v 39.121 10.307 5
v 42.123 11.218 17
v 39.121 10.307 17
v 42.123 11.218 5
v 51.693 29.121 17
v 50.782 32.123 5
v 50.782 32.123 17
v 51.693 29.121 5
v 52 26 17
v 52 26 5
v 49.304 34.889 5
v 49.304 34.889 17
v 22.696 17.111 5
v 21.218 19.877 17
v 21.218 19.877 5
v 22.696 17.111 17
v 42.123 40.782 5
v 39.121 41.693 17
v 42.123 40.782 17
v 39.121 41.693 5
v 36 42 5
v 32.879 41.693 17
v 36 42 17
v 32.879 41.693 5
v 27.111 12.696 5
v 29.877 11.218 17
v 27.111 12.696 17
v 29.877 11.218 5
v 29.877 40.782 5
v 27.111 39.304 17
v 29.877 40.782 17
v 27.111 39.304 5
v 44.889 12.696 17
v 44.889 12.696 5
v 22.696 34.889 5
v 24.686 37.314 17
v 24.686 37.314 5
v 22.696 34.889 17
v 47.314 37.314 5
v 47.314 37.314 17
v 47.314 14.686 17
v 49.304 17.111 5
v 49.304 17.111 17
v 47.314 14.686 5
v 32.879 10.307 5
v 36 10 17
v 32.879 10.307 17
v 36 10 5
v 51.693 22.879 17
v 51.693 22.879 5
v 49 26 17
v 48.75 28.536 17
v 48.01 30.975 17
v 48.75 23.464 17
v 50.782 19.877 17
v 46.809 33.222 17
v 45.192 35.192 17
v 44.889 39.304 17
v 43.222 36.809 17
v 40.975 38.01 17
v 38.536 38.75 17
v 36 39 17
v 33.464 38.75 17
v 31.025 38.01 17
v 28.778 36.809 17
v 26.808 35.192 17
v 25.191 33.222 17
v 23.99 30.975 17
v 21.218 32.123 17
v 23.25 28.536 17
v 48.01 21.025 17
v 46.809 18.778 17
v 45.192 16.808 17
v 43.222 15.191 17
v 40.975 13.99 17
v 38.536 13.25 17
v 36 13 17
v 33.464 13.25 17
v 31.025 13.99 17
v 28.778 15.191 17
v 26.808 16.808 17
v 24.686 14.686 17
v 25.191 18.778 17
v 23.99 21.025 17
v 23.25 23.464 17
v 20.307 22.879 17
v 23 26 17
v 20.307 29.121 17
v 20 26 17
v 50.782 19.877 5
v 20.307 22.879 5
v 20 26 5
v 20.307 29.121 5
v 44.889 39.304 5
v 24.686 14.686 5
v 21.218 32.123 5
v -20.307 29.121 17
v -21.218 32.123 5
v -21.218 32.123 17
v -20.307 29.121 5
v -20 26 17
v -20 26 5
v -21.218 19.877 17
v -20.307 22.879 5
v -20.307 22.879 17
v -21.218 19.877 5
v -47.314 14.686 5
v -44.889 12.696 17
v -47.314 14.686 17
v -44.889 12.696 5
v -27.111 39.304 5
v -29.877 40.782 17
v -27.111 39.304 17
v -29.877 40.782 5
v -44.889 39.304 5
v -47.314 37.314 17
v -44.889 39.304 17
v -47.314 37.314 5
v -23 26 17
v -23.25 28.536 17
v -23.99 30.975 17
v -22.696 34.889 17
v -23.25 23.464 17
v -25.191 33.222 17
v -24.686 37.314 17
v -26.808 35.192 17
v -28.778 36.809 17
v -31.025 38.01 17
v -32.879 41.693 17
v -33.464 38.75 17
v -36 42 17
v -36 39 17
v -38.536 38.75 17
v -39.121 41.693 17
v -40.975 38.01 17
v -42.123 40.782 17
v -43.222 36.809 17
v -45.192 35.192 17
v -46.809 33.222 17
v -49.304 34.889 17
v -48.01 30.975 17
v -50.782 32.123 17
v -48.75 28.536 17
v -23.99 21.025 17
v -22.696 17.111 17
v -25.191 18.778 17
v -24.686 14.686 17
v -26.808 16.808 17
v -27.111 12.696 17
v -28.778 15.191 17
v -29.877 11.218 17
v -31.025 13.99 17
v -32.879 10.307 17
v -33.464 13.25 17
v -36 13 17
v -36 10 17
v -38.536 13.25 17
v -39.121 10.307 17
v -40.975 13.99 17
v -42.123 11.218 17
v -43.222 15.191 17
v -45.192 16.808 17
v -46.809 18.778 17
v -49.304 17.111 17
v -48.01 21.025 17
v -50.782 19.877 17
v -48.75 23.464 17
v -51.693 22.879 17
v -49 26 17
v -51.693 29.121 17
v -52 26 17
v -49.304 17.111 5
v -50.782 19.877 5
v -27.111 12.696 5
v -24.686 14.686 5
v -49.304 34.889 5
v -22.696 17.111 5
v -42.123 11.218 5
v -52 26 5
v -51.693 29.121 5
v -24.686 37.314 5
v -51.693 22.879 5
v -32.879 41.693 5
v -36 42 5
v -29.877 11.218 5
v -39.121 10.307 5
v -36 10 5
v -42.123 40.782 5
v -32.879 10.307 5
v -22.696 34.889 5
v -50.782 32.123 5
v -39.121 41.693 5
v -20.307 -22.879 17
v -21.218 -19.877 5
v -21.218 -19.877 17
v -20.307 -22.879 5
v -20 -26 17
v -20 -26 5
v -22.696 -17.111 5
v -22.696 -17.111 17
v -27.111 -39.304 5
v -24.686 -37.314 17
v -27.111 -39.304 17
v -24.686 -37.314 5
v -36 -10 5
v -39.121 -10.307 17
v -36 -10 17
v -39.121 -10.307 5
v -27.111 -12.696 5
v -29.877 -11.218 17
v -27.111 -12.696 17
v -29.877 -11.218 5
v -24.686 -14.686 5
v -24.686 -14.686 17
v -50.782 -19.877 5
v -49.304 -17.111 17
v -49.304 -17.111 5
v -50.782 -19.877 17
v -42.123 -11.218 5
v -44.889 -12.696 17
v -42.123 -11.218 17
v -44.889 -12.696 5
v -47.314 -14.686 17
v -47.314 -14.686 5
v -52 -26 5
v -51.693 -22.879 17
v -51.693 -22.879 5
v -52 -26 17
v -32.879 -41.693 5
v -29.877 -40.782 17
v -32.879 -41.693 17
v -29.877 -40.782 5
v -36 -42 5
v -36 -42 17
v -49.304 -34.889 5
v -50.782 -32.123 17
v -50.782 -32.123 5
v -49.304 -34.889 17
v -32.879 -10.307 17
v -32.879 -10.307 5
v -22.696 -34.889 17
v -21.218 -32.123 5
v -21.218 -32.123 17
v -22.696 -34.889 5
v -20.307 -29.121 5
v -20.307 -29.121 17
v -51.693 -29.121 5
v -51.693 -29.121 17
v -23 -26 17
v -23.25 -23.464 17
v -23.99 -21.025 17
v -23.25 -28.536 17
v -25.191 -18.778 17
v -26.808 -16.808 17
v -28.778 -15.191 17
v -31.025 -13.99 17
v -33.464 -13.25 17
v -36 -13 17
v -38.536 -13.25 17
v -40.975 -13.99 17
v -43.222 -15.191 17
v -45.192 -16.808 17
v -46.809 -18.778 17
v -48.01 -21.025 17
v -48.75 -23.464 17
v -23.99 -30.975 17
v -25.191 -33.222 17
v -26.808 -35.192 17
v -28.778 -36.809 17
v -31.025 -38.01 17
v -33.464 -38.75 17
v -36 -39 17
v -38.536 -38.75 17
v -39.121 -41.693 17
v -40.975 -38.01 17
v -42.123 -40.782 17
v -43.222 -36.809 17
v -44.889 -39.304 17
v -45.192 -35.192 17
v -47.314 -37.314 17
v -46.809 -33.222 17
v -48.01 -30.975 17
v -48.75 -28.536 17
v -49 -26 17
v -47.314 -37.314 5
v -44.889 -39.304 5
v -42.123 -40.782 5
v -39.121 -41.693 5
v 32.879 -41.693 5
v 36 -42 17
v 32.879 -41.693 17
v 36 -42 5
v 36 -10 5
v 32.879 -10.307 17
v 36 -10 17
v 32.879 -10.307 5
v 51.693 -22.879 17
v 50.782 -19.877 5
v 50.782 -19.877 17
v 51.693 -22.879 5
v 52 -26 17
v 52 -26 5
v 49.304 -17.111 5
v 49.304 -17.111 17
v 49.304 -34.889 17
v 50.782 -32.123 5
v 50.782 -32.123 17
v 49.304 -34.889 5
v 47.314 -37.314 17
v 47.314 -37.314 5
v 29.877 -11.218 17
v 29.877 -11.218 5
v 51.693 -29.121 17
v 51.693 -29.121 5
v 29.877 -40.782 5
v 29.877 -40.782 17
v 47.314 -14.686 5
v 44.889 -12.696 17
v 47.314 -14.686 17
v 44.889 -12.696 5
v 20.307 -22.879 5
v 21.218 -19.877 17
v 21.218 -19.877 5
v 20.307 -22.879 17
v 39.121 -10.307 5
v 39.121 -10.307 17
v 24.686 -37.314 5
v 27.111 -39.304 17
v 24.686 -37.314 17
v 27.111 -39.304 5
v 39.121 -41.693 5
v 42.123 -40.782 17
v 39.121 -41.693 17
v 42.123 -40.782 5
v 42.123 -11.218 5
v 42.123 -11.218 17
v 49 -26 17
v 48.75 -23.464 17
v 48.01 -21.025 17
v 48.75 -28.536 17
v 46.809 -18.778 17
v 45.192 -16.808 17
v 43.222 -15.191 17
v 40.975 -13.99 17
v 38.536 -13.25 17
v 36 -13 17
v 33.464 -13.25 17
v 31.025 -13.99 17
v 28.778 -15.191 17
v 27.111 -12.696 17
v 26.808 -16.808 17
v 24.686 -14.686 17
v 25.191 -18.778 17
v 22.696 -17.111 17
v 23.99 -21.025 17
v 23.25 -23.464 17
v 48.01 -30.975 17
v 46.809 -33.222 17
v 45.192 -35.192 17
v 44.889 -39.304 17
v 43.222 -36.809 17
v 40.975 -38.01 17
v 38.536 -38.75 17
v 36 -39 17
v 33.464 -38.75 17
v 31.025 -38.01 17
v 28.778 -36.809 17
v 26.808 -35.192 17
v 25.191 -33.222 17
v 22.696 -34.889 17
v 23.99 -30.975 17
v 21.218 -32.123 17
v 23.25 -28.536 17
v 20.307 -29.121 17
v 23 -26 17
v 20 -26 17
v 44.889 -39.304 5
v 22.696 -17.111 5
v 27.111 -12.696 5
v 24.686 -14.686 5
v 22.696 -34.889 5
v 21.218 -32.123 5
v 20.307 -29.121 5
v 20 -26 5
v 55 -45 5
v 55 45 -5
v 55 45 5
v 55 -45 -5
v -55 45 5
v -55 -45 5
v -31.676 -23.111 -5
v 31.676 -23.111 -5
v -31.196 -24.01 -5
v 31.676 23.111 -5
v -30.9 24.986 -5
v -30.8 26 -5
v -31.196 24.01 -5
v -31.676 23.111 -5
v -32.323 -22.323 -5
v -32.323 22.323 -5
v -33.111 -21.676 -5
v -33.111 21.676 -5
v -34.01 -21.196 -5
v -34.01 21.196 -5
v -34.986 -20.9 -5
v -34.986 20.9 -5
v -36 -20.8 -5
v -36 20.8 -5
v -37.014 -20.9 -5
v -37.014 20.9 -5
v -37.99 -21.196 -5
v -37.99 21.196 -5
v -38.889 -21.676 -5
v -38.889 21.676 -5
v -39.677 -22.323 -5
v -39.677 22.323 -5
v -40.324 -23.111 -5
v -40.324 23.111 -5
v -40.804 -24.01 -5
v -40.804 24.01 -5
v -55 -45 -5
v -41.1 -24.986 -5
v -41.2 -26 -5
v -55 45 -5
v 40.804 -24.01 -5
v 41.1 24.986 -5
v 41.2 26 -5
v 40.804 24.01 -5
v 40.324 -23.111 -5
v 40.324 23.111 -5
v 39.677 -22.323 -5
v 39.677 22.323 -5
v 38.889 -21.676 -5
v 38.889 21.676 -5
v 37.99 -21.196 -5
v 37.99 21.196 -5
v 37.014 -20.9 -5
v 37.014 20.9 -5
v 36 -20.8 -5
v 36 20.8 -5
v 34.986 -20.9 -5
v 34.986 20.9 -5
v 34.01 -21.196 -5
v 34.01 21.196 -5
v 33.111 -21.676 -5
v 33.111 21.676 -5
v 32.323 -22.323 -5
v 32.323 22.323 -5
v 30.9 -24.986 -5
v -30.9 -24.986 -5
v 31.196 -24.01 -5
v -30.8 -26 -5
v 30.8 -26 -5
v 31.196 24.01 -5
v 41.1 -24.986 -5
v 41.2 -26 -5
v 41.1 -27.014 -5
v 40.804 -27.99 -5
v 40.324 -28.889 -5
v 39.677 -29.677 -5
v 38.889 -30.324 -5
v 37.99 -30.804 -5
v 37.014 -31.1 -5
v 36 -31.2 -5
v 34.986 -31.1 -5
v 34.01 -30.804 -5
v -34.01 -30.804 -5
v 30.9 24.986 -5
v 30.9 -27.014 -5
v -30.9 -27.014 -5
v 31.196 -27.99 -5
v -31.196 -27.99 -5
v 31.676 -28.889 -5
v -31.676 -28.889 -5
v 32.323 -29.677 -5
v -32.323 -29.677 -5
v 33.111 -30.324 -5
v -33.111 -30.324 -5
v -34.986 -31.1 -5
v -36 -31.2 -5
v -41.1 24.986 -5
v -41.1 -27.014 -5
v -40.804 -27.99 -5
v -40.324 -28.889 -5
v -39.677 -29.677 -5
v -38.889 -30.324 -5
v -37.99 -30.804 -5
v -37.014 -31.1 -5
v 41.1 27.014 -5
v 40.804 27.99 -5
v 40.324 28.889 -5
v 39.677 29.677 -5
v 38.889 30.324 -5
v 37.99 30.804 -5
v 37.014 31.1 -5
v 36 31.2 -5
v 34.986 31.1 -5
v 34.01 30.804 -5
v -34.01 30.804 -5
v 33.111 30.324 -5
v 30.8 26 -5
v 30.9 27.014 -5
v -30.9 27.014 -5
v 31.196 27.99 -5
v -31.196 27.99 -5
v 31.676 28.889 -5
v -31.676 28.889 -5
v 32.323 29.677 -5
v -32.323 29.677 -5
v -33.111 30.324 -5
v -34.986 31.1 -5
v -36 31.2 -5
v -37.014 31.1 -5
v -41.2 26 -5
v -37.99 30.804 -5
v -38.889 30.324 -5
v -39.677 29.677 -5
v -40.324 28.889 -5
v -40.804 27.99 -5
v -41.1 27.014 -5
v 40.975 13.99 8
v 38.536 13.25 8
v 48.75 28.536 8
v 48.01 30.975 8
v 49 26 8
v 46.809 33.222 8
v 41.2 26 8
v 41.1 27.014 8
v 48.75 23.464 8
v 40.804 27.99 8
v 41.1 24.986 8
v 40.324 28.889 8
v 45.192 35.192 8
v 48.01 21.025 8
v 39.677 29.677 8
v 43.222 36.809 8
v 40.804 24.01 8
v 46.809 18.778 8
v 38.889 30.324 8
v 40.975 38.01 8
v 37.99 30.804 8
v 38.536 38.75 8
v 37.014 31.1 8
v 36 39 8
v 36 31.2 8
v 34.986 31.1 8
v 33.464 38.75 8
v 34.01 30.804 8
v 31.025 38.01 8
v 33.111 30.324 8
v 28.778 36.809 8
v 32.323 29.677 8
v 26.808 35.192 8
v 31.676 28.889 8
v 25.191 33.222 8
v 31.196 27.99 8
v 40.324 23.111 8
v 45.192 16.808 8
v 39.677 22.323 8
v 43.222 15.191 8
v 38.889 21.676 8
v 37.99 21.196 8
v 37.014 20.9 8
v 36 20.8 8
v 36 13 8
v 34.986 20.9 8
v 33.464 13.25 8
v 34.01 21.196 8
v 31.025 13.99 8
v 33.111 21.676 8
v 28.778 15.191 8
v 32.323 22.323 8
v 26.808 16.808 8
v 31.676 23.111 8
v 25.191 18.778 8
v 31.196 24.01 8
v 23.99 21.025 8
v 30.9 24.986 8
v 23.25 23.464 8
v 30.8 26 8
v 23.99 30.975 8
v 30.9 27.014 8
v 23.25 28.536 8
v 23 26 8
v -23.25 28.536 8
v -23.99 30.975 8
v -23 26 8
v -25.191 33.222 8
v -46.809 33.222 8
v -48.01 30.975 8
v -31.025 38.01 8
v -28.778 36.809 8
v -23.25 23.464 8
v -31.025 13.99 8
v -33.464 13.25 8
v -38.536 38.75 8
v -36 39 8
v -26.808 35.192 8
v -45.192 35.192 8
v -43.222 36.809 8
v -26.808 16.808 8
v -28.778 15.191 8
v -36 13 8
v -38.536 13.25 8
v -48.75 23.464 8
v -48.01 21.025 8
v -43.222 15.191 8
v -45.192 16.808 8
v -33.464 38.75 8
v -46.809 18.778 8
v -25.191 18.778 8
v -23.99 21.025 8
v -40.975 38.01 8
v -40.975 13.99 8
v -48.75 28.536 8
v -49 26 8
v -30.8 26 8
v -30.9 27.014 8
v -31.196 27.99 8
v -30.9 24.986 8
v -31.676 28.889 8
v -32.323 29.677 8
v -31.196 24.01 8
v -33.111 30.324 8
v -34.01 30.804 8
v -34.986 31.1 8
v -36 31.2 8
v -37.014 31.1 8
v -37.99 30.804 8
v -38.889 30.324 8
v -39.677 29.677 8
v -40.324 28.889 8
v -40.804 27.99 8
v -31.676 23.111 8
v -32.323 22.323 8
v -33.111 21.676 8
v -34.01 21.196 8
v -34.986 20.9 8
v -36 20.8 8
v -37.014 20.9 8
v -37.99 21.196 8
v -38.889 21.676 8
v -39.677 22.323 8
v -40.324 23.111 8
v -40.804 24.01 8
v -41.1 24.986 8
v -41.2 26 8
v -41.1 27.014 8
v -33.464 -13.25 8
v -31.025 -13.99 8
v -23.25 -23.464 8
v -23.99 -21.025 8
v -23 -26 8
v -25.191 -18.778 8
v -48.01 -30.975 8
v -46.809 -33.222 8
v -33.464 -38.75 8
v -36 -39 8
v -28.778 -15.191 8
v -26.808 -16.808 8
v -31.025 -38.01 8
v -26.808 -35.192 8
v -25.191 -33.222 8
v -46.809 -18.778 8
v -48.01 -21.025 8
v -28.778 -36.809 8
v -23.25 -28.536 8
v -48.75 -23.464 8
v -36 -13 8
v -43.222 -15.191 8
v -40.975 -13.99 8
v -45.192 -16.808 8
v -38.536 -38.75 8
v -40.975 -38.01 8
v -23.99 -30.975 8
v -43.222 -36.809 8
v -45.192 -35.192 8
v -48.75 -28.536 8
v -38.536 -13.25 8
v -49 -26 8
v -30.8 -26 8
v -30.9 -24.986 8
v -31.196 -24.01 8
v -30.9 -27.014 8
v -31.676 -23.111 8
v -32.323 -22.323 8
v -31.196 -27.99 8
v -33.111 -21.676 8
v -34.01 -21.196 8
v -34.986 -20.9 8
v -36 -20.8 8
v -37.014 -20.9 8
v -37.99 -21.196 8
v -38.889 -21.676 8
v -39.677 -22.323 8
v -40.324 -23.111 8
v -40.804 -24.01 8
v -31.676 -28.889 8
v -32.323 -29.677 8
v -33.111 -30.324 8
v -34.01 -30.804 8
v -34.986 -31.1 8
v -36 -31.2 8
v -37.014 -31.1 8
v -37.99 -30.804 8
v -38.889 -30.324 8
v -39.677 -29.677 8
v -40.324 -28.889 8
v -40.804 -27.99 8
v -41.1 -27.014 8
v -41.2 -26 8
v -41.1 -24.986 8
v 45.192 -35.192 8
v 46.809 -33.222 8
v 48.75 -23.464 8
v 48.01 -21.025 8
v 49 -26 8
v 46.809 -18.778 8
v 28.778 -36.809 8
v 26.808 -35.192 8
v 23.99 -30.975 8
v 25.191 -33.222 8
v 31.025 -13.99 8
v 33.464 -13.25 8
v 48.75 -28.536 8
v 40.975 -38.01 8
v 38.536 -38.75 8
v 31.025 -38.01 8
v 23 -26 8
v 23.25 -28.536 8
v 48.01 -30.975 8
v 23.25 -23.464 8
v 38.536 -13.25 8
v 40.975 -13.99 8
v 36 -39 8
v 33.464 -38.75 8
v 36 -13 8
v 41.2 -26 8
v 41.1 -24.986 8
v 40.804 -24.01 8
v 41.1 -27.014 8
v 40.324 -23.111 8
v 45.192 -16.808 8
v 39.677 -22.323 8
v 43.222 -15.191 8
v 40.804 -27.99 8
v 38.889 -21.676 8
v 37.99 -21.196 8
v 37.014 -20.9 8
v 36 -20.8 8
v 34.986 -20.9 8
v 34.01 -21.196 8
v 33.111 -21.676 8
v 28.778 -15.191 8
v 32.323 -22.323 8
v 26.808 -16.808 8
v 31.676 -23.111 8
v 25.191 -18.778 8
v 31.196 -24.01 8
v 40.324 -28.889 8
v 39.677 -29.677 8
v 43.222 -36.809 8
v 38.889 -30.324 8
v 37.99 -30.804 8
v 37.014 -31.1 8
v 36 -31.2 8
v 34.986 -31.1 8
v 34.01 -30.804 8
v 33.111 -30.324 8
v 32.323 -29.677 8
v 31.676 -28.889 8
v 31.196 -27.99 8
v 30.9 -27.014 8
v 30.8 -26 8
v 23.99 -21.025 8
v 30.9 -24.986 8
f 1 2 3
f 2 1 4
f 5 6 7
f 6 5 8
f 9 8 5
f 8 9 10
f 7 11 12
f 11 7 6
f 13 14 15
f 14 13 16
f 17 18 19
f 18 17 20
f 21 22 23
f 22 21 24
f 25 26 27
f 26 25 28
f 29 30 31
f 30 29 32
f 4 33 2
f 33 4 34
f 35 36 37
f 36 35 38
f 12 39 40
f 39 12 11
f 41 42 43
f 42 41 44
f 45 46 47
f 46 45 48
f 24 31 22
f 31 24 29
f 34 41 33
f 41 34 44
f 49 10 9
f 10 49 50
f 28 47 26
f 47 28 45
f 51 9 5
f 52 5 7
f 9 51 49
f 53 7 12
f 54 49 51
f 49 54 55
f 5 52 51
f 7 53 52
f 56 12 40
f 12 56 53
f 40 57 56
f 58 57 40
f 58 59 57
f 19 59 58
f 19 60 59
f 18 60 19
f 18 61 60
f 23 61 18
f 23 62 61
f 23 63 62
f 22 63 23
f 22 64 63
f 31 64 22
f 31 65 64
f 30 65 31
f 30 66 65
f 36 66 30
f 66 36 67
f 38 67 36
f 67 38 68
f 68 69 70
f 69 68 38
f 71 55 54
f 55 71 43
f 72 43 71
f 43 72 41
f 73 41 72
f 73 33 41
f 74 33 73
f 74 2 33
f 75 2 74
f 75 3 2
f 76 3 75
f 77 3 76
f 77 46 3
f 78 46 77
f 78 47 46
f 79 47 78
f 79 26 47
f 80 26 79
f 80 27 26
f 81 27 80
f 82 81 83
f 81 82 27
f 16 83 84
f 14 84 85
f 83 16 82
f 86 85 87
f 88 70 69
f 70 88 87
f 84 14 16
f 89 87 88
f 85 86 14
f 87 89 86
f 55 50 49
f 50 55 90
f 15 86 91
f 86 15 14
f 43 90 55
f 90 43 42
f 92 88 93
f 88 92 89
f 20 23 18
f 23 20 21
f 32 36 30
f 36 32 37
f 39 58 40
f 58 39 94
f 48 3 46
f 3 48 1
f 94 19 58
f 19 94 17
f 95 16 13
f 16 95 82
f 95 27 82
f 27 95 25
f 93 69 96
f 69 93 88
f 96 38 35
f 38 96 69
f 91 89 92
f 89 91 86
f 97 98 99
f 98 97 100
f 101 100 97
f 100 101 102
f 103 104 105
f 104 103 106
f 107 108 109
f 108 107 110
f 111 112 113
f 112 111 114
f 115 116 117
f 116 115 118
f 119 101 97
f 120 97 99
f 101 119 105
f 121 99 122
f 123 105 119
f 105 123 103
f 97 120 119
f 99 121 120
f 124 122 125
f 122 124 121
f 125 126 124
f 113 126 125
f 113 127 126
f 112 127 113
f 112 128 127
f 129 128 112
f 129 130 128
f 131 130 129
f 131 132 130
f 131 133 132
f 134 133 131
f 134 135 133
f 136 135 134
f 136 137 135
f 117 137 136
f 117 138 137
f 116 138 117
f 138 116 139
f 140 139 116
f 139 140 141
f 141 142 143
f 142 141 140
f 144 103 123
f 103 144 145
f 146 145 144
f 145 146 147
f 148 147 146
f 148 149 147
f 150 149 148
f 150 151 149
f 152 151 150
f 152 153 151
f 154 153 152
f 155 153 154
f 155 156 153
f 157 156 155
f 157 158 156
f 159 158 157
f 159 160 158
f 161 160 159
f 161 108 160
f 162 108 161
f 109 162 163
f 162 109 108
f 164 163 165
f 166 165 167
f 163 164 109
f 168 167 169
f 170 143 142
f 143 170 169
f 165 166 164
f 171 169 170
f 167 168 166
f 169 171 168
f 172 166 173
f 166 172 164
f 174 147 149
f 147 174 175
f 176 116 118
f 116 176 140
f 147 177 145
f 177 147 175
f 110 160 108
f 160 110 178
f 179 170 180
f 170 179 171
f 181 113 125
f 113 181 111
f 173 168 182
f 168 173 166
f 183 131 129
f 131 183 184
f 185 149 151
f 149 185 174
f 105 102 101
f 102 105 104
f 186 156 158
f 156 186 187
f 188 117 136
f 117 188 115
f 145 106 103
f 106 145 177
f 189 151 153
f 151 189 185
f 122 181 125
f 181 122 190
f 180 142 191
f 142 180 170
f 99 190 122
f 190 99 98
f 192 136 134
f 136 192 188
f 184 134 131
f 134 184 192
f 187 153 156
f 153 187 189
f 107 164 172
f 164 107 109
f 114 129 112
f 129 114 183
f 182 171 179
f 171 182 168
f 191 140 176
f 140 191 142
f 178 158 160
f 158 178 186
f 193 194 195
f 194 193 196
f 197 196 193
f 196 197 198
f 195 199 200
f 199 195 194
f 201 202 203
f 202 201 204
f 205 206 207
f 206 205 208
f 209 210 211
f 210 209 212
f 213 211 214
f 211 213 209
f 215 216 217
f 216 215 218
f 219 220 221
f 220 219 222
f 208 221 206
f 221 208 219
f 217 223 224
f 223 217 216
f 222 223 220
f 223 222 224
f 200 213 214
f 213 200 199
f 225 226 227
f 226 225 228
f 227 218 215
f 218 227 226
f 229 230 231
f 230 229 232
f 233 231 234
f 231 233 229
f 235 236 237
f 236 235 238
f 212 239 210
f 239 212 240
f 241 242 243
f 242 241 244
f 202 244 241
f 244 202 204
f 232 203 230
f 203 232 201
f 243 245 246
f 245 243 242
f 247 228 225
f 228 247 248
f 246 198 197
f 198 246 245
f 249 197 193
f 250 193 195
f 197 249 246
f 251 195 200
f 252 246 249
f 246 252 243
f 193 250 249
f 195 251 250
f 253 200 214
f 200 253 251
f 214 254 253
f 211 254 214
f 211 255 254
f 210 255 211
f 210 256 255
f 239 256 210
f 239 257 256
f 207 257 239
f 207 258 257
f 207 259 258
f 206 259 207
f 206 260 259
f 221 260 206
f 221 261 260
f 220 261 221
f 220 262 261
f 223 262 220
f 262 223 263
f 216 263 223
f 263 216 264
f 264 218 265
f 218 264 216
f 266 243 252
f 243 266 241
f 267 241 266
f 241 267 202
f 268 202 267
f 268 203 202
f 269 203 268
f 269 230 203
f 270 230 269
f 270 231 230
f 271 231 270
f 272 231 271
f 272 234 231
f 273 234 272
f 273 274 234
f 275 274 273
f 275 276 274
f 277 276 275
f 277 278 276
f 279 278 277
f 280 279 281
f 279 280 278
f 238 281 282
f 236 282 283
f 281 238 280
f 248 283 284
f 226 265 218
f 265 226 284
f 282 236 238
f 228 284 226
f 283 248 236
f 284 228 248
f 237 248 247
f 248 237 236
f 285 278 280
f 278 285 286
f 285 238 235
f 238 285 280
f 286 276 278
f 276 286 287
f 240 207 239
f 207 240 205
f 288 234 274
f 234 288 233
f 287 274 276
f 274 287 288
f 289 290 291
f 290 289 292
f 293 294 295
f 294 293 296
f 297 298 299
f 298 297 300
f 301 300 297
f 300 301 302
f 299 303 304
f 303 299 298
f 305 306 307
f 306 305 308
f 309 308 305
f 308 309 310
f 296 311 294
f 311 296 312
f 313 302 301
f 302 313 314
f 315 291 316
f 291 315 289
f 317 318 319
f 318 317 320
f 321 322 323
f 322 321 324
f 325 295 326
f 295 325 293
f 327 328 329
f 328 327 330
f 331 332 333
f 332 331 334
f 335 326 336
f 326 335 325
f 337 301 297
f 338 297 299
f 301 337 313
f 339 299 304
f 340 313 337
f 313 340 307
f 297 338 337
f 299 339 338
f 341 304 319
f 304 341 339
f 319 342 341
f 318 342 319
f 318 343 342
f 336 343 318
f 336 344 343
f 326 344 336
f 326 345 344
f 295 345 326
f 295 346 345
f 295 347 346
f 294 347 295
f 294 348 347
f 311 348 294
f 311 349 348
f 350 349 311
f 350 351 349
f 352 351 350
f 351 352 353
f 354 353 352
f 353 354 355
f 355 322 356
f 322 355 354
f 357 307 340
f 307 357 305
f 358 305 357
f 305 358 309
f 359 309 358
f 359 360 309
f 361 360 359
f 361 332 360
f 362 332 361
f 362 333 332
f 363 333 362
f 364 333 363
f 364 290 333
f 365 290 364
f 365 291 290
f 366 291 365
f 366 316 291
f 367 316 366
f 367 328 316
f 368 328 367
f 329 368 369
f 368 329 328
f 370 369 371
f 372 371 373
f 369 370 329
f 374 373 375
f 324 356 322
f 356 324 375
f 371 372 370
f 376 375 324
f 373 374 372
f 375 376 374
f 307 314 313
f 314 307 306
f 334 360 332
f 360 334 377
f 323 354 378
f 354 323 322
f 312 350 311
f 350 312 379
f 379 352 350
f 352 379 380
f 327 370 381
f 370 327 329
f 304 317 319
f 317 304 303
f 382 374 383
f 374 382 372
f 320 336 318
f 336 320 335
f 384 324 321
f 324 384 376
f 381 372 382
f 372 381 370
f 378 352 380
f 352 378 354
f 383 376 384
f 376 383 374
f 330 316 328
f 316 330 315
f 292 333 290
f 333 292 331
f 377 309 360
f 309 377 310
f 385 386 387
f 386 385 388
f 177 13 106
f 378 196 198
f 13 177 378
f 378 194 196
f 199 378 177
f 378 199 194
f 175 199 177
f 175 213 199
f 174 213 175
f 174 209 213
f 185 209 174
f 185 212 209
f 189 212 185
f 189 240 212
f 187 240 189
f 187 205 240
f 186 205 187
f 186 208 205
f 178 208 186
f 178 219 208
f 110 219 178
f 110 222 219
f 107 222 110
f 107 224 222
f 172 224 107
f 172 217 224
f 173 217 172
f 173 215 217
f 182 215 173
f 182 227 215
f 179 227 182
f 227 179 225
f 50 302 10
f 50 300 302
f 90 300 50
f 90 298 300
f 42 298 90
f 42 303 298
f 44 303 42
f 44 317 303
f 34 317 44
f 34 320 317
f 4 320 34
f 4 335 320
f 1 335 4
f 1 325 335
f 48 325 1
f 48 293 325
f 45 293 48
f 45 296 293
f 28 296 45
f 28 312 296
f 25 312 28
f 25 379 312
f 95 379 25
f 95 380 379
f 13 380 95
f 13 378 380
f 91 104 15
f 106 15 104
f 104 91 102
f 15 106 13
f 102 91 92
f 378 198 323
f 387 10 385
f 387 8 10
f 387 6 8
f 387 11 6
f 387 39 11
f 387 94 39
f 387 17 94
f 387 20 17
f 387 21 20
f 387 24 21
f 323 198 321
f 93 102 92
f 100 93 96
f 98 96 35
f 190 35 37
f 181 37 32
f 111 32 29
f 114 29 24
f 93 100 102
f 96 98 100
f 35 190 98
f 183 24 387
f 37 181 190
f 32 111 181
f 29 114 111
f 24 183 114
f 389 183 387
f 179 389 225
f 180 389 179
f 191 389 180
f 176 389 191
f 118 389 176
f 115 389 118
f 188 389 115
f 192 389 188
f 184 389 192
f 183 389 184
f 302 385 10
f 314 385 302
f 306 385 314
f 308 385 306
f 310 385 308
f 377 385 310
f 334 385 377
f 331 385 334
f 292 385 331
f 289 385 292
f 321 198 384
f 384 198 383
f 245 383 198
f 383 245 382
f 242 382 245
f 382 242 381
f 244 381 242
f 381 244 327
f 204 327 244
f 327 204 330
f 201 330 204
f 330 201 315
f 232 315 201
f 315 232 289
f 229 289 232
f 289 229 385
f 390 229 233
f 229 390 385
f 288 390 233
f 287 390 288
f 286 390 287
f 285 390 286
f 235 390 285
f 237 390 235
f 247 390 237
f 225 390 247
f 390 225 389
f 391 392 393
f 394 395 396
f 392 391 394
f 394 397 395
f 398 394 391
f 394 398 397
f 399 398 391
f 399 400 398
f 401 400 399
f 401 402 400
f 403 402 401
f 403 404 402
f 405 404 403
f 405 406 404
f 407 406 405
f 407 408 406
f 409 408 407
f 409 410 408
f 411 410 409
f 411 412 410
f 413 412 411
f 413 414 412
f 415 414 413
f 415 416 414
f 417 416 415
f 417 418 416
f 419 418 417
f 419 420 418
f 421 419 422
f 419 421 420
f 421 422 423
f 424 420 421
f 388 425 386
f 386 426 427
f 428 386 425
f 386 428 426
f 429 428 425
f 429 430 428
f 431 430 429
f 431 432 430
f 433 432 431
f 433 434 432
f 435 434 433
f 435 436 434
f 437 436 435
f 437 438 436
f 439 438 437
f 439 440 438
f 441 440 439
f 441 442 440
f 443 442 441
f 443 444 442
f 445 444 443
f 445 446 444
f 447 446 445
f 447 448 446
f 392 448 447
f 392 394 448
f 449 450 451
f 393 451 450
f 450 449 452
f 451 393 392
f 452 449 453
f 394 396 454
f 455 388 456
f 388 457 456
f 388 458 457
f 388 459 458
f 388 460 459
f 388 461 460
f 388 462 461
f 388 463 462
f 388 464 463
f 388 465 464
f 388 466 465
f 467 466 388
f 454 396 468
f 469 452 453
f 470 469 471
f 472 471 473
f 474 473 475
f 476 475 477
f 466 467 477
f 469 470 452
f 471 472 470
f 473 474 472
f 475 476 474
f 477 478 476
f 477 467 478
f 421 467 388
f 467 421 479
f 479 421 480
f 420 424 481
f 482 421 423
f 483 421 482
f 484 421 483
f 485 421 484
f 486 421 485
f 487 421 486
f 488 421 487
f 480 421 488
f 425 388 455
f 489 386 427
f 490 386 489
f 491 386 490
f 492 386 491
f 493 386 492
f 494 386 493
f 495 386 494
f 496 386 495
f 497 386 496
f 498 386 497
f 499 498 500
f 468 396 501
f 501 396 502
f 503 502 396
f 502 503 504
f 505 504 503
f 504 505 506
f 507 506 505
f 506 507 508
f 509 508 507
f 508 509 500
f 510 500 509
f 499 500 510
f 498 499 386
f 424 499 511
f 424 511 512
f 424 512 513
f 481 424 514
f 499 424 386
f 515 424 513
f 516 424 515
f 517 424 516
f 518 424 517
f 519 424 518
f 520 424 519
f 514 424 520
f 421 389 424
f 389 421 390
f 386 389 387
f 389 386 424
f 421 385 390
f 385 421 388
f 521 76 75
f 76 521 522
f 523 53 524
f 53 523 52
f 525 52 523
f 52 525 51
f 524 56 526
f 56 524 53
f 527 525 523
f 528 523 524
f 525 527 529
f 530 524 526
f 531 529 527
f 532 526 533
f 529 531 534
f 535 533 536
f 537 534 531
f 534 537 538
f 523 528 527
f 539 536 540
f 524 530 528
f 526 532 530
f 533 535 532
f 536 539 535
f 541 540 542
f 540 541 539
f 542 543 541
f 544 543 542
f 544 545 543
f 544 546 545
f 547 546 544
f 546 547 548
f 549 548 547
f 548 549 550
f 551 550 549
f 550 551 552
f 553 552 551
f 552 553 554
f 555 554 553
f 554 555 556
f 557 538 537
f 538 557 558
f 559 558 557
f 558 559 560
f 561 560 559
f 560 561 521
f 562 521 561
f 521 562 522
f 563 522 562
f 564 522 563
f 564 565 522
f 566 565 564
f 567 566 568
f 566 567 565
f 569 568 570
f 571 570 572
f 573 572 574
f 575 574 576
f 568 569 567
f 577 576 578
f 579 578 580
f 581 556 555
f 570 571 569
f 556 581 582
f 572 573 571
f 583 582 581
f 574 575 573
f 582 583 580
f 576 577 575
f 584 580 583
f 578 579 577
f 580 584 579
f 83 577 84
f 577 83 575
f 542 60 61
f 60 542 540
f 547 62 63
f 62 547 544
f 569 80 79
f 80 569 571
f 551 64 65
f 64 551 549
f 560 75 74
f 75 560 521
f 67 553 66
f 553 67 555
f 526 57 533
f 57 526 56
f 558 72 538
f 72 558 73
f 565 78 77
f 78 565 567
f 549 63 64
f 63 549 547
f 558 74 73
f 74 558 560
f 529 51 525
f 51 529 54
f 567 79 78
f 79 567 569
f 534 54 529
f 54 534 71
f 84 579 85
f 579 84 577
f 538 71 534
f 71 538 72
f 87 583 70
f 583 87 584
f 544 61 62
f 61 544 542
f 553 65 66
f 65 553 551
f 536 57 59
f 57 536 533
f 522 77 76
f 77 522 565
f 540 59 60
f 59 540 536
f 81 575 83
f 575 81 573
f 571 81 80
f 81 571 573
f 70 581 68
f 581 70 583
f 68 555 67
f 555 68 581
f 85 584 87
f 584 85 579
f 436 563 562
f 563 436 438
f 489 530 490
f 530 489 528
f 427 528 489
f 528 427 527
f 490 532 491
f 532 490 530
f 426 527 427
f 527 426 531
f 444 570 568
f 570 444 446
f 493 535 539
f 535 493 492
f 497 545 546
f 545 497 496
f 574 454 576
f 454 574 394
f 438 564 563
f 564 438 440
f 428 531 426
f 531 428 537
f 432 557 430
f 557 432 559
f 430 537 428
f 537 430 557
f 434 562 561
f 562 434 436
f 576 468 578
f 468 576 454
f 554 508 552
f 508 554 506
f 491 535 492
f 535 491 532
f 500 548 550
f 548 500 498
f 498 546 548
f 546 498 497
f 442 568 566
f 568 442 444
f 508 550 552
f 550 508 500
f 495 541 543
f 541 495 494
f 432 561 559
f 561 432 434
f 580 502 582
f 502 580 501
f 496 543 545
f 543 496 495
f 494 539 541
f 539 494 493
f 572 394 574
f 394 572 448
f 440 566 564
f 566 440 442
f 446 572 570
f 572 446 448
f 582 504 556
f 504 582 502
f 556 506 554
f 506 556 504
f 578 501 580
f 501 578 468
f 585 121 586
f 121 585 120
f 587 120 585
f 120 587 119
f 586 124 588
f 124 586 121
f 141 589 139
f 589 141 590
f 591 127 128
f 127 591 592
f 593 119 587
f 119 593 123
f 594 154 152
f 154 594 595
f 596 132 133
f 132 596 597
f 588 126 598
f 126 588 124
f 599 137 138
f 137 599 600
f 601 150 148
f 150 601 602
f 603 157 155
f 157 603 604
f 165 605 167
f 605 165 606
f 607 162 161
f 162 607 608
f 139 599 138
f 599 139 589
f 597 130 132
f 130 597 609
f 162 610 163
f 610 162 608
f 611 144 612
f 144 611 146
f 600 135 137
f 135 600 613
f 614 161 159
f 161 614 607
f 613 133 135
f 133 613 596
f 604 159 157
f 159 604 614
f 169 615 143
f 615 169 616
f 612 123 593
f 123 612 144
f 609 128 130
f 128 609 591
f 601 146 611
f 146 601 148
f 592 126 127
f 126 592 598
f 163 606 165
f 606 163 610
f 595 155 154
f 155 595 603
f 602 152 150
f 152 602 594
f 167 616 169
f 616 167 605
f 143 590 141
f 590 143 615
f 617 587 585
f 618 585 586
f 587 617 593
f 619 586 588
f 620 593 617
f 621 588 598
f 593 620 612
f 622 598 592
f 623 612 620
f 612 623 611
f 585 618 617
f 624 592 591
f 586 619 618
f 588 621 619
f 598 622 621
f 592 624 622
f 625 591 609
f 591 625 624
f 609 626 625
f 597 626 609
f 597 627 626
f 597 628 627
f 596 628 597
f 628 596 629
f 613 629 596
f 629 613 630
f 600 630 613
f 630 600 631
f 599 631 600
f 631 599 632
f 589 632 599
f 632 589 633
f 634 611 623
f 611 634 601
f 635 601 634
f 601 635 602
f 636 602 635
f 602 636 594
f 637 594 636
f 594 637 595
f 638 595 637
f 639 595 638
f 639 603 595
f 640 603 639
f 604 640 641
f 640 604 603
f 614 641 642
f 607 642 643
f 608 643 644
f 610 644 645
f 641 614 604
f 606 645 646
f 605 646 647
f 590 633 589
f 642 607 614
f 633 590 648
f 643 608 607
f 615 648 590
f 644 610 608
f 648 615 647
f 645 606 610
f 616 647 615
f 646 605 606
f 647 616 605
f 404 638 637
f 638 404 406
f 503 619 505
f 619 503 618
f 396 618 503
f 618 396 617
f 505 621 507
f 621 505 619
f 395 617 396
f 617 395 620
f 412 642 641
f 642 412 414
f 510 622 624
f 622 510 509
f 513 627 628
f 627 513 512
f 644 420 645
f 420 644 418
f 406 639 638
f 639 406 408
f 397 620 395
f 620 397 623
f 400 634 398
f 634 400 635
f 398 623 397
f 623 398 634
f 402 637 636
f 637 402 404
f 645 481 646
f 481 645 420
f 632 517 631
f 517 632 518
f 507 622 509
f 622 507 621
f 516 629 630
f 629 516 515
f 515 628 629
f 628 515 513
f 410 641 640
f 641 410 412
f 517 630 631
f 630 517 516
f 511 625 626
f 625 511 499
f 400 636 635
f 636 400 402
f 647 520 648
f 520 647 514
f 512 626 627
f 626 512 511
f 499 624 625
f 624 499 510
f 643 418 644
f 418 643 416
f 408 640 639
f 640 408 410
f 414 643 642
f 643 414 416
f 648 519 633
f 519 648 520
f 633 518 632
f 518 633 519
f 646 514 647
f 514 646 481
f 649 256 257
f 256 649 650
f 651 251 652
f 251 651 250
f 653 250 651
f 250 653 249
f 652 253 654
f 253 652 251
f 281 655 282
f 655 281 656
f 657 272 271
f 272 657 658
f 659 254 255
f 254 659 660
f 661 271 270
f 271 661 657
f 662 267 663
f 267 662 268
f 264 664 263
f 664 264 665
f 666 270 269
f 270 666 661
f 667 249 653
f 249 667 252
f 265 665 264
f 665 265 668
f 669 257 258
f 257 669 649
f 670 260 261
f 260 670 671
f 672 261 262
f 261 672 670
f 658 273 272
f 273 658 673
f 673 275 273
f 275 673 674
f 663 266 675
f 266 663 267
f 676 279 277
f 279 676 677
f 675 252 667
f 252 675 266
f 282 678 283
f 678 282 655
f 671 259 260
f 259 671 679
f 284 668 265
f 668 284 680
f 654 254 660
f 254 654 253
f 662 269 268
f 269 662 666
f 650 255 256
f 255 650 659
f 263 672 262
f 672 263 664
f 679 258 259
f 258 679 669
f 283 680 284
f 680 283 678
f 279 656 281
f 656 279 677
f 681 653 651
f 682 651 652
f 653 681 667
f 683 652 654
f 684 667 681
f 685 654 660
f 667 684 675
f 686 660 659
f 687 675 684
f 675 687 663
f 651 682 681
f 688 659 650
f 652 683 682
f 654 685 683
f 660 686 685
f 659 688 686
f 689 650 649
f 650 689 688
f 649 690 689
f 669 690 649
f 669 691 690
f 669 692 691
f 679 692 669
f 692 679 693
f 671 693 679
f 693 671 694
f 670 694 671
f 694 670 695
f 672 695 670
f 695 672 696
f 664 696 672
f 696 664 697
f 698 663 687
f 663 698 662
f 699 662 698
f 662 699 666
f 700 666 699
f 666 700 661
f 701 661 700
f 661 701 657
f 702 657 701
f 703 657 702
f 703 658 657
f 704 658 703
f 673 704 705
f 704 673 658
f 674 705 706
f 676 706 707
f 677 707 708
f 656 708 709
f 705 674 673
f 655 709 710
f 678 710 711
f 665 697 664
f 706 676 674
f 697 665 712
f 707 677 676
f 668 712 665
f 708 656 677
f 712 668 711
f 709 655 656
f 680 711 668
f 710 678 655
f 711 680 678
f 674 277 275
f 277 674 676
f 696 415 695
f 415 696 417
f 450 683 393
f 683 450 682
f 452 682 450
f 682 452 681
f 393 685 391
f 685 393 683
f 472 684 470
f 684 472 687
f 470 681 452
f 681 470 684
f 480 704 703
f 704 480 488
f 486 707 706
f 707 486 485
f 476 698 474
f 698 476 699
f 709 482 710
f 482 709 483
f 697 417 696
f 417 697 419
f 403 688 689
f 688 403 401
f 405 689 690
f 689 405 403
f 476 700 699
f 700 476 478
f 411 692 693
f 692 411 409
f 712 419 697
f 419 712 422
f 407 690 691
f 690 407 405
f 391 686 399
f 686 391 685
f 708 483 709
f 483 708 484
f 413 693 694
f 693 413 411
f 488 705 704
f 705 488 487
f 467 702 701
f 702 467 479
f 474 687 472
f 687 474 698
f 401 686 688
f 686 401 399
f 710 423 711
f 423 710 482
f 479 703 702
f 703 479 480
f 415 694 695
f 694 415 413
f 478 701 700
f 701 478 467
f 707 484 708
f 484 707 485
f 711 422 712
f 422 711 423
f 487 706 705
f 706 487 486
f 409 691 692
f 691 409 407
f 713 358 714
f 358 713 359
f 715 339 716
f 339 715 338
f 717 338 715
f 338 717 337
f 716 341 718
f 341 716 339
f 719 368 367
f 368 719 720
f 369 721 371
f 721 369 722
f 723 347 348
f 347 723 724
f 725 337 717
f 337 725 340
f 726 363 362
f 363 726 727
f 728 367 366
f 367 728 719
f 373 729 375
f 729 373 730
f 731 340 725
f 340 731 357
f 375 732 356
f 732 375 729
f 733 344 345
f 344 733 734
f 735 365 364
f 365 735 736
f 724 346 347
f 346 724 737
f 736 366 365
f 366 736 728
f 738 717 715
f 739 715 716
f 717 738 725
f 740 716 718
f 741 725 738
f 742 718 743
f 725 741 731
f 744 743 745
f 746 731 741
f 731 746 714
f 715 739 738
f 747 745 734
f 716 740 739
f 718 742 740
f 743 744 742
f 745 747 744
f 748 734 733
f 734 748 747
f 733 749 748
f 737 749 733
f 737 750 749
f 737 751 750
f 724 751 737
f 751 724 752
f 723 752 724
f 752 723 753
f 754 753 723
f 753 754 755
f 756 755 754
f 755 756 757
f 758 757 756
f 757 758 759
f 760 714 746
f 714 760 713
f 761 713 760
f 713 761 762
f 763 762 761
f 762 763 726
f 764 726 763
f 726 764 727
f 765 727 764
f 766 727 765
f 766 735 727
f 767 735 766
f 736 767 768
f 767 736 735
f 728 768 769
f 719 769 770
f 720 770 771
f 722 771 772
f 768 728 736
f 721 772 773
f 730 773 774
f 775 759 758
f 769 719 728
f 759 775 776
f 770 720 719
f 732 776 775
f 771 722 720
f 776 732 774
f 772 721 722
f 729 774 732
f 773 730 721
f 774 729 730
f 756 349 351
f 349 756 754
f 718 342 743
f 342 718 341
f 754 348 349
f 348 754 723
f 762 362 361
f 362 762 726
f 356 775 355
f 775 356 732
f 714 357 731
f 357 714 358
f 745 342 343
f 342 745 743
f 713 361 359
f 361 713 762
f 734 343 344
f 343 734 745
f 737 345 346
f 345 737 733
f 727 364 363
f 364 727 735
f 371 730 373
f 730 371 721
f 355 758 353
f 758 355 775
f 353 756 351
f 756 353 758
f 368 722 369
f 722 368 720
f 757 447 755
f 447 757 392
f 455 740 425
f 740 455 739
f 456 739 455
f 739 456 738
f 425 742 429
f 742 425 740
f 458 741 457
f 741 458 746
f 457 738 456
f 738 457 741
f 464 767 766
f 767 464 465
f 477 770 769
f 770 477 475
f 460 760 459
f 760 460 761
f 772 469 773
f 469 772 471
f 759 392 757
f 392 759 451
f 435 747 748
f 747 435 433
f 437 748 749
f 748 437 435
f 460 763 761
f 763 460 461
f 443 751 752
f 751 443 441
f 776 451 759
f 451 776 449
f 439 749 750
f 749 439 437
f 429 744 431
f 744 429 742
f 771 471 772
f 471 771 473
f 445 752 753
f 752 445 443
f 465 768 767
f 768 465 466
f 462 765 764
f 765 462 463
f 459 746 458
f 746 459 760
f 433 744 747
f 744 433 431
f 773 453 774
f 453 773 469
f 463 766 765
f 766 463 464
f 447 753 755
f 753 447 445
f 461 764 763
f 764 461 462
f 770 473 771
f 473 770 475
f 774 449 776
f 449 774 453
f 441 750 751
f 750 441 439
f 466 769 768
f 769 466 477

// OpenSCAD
$fn = 32;

// ----------------------------------------------------------------------
// Socket pad plate
// bosses with counterbored sockets for the screws
// ----------------------------------------------------------------------

// --- parameters (mm) ---
base_t = 10;            // base plate thickness
boss_h = 12;            // boss height above the base plate
boss_d = 32;            // boss diameter
socket_d = 26;          // socket diameter
socket_depth = 9;       // socket depth from the boss face
bolt_d = 10.4;          // screw clearance hole through the socket floor
plate = [110, 90, 10];  // overall size (x, y, z)
edge = 19;              // boss centre offset from the plate edge
pads = 4;               // boss count, one per corner

// --- derived feature positions (mm) ---
height = base_t + boss_h;        // = 22   overall height of the part
corner_x = plate[0] / 2 - edge;  // = 36   boss centre X
corner_y = plate[1] / 2 - edge;  // = 26   boss centre Y
feature_centers = [
  [corner_x, corner_y],
  [-corner_x, corner_y],
  [-corner_x, -corner_y],
  [corner_x, -corner_y]
];   // boss centres: sockets, holes and the pads themselves are placed from here

// base plate, bosses on feature_centers, socket + through hole in each
difference() {
  union() {
    cube(plate, center = true);
    for (centre = feature_centers)
      translate([centre[0], centre[1], plate[2] / 2 - 1])
        cylinder(d = boss_d, h = boss_h + 1);
  }
  for (centre = feature_centers) {
    translate([centre[0], centre[1], plate[2] / 2 + boss_h - socket_depth])
      cylinder(d = socket_d, h = socket_depth + 1);
    translate([centre[0], centre[1], -height])
      cylinder(d = bolt_d, h = 2 * height + 2);  // through the socket floor
  }
}
